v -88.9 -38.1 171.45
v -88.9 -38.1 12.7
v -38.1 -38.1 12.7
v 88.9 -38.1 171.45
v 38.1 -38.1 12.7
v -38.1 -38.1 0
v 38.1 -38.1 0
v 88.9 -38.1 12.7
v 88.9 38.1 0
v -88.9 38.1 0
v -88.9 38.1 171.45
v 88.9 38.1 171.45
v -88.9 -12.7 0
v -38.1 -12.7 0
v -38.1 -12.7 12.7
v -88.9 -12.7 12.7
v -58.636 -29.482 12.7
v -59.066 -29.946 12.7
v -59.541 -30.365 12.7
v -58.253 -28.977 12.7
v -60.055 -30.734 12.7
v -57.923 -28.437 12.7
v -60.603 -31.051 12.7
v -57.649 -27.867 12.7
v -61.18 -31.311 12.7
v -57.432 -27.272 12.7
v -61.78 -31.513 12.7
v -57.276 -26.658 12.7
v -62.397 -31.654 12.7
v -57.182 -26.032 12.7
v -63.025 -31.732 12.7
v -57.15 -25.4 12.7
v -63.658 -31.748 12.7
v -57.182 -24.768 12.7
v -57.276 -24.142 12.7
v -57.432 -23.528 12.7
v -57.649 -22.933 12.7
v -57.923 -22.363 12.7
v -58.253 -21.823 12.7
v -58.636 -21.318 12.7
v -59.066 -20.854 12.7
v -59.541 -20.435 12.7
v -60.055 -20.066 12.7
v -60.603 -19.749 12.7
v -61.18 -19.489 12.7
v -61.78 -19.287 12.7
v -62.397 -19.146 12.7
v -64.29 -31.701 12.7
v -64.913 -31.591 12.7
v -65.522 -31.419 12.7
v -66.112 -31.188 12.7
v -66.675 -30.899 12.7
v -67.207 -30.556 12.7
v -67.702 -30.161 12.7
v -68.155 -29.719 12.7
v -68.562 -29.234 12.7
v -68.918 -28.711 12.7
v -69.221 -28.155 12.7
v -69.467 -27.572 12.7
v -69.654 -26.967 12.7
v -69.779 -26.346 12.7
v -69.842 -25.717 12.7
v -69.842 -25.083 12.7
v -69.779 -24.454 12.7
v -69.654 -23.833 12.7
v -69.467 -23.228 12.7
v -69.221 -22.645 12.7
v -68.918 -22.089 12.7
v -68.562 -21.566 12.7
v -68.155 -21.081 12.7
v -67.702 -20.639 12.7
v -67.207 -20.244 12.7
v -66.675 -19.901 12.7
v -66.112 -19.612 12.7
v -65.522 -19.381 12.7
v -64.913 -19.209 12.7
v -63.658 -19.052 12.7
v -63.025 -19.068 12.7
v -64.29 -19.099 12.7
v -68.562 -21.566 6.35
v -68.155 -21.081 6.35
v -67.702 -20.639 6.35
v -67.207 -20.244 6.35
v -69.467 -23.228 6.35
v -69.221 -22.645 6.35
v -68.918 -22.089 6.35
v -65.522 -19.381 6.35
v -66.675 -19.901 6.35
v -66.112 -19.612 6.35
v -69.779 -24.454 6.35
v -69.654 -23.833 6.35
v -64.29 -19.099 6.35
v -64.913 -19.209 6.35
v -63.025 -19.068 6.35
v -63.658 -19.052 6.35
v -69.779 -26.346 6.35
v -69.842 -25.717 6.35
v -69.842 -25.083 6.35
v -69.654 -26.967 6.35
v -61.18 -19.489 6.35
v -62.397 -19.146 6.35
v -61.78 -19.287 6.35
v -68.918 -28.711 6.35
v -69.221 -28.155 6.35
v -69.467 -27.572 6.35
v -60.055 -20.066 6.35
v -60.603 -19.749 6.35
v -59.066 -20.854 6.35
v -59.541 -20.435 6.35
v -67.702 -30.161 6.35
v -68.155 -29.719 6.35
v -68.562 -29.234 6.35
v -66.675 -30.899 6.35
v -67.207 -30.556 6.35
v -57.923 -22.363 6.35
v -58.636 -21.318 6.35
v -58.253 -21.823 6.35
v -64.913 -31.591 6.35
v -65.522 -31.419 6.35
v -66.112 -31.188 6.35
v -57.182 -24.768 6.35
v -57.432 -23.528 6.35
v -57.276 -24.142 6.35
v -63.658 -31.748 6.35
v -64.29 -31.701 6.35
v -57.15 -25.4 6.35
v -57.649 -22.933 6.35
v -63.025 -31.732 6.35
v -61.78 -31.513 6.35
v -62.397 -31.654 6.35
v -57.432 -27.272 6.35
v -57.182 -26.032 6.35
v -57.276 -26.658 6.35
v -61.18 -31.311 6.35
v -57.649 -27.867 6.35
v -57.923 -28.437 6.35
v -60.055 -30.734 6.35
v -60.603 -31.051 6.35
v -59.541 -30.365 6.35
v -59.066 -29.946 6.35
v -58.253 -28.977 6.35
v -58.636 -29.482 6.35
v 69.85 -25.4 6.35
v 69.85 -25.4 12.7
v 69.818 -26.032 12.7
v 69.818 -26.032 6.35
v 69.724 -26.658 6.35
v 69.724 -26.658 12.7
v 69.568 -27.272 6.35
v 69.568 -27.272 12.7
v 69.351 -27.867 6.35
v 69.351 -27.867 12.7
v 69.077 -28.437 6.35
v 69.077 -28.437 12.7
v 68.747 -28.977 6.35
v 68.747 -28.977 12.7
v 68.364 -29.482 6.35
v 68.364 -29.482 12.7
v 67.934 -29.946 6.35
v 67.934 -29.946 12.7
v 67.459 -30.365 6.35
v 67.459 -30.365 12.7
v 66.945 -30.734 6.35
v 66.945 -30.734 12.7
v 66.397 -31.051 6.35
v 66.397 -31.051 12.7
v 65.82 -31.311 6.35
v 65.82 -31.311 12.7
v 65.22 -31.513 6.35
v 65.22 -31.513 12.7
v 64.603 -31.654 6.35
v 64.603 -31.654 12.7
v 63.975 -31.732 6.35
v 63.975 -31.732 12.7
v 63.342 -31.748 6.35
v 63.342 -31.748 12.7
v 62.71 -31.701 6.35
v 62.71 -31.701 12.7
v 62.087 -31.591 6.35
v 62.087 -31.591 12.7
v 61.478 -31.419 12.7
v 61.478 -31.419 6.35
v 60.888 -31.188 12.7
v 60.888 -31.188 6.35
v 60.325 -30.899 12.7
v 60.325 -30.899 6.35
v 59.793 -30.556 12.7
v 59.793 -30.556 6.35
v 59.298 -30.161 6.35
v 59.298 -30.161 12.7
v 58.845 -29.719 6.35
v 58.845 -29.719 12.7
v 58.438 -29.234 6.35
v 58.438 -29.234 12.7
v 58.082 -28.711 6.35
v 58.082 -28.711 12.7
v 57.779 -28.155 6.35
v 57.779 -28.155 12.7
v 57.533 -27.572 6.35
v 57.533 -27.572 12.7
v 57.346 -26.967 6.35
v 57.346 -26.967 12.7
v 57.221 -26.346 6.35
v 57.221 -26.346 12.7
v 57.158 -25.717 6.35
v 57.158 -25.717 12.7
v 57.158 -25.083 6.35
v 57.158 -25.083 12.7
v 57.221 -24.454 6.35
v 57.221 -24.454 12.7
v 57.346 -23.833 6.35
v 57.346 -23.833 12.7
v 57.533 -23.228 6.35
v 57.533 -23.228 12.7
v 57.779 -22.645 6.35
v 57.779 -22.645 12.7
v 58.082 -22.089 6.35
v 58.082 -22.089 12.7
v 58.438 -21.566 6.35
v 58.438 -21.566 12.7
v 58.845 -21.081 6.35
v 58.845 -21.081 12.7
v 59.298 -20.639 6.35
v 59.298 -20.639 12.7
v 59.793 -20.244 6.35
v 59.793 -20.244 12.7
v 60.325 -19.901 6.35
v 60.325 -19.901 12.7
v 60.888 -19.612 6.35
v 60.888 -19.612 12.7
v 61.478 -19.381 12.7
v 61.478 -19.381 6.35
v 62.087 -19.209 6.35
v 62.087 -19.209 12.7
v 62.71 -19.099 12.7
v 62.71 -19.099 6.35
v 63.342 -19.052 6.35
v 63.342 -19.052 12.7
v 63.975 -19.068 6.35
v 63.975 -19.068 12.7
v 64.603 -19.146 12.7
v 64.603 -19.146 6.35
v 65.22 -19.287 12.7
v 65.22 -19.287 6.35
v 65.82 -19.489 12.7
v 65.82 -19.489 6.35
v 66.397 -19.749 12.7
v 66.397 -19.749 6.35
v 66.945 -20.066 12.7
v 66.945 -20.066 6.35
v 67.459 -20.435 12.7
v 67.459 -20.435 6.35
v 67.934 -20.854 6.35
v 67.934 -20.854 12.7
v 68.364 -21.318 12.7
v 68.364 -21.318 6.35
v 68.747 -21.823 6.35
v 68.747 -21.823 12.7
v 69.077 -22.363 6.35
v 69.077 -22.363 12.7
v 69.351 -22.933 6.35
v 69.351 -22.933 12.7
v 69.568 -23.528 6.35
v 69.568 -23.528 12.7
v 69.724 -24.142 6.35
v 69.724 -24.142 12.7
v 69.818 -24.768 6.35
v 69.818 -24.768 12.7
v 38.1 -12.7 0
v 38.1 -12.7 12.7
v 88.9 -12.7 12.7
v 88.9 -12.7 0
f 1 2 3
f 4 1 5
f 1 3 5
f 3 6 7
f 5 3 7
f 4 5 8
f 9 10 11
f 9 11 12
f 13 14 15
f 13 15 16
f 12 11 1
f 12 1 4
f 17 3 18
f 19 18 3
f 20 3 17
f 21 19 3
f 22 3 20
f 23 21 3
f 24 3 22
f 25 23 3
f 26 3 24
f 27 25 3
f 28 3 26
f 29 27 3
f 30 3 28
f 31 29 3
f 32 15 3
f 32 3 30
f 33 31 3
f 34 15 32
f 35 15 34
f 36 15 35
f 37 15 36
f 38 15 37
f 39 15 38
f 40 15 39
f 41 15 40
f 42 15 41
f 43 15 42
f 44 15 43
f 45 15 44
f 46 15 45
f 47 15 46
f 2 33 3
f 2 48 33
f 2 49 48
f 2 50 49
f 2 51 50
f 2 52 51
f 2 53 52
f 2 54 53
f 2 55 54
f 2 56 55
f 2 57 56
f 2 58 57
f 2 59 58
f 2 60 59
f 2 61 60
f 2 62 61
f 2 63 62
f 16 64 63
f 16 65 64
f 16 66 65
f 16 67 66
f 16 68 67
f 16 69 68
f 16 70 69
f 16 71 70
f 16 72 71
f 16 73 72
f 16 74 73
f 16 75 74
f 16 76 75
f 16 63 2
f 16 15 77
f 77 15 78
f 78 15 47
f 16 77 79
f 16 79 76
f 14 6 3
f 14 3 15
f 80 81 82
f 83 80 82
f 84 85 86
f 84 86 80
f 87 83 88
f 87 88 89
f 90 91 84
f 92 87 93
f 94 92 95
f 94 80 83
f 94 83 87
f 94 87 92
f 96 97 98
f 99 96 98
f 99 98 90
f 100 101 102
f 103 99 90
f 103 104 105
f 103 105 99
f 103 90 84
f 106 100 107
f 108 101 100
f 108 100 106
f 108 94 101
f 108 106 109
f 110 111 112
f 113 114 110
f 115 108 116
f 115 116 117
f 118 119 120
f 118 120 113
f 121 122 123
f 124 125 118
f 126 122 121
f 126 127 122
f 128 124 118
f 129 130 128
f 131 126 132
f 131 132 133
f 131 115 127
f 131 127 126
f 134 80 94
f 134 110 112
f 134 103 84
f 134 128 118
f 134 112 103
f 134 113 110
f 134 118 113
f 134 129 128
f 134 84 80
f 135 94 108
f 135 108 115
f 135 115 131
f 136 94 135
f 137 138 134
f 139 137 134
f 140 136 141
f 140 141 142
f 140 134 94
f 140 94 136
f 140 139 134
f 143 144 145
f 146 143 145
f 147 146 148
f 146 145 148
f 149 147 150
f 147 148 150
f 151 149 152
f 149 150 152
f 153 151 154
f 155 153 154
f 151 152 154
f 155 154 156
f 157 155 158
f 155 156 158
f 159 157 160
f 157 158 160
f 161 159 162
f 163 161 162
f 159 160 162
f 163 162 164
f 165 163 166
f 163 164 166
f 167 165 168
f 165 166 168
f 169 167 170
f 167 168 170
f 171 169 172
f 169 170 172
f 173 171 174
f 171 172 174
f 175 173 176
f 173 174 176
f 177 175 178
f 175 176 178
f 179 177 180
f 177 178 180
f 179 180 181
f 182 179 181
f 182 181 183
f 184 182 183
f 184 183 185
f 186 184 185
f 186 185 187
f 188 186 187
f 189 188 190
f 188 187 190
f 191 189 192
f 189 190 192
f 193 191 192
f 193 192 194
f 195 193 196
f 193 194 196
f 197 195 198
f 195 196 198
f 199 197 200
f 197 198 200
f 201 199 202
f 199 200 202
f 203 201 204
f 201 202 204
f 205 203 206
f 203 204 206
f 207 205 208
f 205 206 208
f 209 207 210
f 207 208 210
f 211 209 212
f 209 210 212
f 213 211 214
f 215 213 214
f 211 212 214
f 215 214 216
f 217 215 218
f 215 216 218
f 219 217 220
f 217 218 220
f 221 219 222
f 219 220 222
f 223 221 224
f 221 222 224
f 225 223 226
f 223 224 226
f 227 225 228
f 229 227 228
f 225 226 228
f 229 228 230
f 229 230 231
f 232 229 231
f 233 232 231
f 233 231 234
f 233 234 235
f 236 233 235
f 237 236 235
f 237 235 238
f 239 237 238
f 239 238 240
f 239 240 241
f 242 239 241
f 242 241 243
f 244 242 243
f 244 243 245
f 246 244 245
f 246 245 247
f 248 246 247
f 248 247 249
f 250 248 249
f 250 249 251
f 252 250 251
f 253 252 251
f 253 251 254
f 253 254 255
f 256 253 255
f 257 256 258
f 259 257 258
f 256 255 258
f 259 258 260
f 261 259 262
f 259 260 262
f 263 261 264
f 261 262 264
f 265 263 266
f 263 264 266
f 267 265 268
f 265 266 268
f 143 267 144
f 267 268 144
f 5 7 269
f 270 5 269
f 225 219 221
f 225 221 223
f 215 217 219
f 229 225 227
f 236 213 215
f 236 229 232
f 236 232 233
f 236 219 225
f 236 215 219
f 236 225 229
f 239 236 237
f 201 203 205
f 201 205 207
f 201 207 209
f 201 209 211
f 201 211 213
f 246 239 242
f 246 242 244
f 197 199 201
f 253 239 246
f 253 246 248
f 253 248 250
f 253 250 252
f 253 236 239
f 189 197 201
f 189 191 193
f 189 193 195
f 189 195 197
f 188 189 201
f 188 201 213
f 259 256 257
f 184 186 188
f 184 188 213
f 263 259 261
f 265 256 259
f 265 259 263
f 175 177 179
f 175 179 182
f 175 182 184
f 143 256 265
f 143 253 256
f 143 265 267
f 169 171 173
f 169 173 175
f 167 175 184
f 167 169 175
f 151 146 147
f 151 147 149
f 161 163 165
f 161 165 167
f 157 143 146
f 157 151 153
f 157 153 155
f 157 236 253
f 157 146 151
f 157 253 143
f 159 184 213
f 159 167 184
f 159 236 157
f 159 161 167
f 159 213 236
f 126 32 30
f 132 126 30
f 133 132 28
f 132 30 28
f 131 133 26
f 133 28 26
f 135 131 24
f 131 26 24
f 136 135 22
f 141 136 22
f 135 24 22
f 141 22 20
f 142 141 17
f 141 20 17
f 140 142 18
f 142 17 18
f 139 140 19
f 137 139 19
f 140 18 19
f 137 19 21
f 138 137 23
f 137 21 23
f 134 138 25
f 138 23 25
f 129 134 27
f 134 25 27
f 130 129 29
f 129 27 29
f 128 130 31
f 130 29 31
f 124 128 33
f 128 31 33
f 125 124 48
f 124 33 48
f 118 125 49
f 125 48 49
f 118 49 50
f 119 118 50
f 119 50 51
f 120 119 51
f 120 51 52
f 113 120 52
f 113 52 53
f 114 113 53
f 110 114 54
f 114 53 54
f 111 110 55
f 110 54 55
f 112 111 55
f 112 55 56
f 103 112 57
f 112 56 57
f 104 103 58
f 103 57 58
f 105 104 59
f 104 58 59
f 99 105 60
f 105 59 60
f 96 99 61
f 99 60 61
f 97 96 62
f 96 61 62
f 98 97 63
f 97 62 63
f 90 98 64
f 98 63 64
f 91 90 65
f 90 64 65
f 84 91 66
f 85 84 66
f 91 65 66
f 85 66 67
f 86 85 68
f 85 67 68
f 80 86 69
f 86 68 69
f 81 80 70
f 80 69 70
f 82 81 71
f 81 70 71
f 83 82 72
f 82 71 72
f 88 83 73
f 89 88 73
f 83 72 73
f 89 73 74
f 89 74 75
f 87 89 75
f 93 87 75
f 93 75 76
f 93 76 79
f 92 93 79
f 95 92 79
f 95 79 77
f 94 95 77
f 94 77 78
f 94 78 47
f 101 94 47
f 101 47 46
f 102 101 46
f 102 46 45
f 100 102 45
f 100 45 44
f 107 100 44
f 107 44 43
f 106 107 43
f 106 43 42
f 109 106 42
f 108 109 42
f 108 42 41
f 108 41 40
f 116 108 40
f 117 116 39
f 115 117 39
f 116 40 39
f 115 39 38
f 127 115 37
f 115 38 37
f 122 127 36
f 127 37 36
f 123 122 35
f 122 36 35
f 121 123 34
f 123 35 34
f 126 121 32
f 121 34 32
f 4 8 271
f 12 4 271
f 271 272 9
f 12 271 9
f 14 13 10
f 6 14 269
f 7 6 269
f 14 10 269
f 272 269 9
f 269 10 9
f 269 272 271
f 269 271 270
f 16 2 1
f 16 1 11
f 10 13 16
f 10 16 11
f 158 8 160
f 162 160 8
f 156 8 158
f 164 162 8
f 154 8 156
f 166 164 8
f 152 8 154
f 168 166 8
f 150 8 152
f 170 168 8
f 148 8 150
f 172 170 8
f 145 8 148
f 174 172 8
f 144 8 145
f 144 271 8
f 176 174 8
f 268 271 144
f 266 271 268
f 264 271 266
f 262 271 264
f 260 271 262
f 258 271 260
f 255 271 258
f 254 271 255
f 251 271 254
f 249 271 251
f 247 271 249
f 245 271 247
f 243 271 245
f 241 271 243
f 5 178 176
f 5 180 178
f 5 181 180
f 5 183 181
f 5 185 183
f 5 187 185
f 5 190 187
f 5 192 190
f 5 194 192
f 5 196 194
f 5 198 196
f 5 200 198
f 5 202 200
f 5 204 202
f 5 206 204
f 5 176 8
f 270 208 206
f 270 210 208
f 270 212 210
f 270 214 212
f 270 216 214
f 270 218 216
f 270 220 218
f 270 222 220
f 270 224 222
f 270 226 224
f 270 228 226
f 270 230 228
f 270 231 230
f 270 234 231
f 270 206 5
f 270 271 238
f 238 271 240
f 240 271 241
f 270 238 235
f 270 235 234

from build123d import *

# Parameters (mm, degrees)
SKETCH1_W           = 177.8
SKETCH1_H           = 76.2
BOSS_EXTRUDE1_DEPTH = 171.45
SKETCH2_W           = 50.8
SKETCH2_H           = 25.4
CUT_EXTRUDE1_DEPTH  = 12.7
SKETCH3_R           = 6.35
BOSS_EXTRUDE2_DEPTH = 6.35


with BuildPart() as part:
    # Sketch1 → Boss-Extrude1 (new body)
    with BuildSketch(Plane.XY):
        Rectangle(SKETCH1_W, SKETCH1_H)
    extrude(amount=BOSS_EXTRUDE1_DEPTH)

    # Sketch2 → Cut-Extrude1 (cut)
    with BuildSketch(Plane(origin=(0, 0, 0), x_dir=(-1, 0, 0), z_dir=(0, 0, -1))):
        with Locations((-63.5, -25.4)):
            Rectangle(SKETCH2_W, SKETCH2_H)
        with Locations((63.5, -25.4)):
            Rectangle(SKETCH2_W, SKETCH2_H)
    extrude(amount=-CUT_EXTRUDE1_DEPTH, mode=Mode.SUBTRACT)

    # Sketch3 → Boss-Extrude2 (add)
    with BuildSketch(Plane(origin=(0, 0, 12.7), x_dir=(-1, 0, 0), z_dir=(0, 0, -1))):
        with Locations(Location((-63.5, -25.4, 0), (0, 0, 180))):
            Circle(SKETCH3_R)
        with Locations(Location((63.5, -25.4, 0), (0, 0, 180))):
            Circle(SKETCH3_R)
    extrude(amount=BOSS_EXTRUDE2_DEPTH)


solid = part.part
